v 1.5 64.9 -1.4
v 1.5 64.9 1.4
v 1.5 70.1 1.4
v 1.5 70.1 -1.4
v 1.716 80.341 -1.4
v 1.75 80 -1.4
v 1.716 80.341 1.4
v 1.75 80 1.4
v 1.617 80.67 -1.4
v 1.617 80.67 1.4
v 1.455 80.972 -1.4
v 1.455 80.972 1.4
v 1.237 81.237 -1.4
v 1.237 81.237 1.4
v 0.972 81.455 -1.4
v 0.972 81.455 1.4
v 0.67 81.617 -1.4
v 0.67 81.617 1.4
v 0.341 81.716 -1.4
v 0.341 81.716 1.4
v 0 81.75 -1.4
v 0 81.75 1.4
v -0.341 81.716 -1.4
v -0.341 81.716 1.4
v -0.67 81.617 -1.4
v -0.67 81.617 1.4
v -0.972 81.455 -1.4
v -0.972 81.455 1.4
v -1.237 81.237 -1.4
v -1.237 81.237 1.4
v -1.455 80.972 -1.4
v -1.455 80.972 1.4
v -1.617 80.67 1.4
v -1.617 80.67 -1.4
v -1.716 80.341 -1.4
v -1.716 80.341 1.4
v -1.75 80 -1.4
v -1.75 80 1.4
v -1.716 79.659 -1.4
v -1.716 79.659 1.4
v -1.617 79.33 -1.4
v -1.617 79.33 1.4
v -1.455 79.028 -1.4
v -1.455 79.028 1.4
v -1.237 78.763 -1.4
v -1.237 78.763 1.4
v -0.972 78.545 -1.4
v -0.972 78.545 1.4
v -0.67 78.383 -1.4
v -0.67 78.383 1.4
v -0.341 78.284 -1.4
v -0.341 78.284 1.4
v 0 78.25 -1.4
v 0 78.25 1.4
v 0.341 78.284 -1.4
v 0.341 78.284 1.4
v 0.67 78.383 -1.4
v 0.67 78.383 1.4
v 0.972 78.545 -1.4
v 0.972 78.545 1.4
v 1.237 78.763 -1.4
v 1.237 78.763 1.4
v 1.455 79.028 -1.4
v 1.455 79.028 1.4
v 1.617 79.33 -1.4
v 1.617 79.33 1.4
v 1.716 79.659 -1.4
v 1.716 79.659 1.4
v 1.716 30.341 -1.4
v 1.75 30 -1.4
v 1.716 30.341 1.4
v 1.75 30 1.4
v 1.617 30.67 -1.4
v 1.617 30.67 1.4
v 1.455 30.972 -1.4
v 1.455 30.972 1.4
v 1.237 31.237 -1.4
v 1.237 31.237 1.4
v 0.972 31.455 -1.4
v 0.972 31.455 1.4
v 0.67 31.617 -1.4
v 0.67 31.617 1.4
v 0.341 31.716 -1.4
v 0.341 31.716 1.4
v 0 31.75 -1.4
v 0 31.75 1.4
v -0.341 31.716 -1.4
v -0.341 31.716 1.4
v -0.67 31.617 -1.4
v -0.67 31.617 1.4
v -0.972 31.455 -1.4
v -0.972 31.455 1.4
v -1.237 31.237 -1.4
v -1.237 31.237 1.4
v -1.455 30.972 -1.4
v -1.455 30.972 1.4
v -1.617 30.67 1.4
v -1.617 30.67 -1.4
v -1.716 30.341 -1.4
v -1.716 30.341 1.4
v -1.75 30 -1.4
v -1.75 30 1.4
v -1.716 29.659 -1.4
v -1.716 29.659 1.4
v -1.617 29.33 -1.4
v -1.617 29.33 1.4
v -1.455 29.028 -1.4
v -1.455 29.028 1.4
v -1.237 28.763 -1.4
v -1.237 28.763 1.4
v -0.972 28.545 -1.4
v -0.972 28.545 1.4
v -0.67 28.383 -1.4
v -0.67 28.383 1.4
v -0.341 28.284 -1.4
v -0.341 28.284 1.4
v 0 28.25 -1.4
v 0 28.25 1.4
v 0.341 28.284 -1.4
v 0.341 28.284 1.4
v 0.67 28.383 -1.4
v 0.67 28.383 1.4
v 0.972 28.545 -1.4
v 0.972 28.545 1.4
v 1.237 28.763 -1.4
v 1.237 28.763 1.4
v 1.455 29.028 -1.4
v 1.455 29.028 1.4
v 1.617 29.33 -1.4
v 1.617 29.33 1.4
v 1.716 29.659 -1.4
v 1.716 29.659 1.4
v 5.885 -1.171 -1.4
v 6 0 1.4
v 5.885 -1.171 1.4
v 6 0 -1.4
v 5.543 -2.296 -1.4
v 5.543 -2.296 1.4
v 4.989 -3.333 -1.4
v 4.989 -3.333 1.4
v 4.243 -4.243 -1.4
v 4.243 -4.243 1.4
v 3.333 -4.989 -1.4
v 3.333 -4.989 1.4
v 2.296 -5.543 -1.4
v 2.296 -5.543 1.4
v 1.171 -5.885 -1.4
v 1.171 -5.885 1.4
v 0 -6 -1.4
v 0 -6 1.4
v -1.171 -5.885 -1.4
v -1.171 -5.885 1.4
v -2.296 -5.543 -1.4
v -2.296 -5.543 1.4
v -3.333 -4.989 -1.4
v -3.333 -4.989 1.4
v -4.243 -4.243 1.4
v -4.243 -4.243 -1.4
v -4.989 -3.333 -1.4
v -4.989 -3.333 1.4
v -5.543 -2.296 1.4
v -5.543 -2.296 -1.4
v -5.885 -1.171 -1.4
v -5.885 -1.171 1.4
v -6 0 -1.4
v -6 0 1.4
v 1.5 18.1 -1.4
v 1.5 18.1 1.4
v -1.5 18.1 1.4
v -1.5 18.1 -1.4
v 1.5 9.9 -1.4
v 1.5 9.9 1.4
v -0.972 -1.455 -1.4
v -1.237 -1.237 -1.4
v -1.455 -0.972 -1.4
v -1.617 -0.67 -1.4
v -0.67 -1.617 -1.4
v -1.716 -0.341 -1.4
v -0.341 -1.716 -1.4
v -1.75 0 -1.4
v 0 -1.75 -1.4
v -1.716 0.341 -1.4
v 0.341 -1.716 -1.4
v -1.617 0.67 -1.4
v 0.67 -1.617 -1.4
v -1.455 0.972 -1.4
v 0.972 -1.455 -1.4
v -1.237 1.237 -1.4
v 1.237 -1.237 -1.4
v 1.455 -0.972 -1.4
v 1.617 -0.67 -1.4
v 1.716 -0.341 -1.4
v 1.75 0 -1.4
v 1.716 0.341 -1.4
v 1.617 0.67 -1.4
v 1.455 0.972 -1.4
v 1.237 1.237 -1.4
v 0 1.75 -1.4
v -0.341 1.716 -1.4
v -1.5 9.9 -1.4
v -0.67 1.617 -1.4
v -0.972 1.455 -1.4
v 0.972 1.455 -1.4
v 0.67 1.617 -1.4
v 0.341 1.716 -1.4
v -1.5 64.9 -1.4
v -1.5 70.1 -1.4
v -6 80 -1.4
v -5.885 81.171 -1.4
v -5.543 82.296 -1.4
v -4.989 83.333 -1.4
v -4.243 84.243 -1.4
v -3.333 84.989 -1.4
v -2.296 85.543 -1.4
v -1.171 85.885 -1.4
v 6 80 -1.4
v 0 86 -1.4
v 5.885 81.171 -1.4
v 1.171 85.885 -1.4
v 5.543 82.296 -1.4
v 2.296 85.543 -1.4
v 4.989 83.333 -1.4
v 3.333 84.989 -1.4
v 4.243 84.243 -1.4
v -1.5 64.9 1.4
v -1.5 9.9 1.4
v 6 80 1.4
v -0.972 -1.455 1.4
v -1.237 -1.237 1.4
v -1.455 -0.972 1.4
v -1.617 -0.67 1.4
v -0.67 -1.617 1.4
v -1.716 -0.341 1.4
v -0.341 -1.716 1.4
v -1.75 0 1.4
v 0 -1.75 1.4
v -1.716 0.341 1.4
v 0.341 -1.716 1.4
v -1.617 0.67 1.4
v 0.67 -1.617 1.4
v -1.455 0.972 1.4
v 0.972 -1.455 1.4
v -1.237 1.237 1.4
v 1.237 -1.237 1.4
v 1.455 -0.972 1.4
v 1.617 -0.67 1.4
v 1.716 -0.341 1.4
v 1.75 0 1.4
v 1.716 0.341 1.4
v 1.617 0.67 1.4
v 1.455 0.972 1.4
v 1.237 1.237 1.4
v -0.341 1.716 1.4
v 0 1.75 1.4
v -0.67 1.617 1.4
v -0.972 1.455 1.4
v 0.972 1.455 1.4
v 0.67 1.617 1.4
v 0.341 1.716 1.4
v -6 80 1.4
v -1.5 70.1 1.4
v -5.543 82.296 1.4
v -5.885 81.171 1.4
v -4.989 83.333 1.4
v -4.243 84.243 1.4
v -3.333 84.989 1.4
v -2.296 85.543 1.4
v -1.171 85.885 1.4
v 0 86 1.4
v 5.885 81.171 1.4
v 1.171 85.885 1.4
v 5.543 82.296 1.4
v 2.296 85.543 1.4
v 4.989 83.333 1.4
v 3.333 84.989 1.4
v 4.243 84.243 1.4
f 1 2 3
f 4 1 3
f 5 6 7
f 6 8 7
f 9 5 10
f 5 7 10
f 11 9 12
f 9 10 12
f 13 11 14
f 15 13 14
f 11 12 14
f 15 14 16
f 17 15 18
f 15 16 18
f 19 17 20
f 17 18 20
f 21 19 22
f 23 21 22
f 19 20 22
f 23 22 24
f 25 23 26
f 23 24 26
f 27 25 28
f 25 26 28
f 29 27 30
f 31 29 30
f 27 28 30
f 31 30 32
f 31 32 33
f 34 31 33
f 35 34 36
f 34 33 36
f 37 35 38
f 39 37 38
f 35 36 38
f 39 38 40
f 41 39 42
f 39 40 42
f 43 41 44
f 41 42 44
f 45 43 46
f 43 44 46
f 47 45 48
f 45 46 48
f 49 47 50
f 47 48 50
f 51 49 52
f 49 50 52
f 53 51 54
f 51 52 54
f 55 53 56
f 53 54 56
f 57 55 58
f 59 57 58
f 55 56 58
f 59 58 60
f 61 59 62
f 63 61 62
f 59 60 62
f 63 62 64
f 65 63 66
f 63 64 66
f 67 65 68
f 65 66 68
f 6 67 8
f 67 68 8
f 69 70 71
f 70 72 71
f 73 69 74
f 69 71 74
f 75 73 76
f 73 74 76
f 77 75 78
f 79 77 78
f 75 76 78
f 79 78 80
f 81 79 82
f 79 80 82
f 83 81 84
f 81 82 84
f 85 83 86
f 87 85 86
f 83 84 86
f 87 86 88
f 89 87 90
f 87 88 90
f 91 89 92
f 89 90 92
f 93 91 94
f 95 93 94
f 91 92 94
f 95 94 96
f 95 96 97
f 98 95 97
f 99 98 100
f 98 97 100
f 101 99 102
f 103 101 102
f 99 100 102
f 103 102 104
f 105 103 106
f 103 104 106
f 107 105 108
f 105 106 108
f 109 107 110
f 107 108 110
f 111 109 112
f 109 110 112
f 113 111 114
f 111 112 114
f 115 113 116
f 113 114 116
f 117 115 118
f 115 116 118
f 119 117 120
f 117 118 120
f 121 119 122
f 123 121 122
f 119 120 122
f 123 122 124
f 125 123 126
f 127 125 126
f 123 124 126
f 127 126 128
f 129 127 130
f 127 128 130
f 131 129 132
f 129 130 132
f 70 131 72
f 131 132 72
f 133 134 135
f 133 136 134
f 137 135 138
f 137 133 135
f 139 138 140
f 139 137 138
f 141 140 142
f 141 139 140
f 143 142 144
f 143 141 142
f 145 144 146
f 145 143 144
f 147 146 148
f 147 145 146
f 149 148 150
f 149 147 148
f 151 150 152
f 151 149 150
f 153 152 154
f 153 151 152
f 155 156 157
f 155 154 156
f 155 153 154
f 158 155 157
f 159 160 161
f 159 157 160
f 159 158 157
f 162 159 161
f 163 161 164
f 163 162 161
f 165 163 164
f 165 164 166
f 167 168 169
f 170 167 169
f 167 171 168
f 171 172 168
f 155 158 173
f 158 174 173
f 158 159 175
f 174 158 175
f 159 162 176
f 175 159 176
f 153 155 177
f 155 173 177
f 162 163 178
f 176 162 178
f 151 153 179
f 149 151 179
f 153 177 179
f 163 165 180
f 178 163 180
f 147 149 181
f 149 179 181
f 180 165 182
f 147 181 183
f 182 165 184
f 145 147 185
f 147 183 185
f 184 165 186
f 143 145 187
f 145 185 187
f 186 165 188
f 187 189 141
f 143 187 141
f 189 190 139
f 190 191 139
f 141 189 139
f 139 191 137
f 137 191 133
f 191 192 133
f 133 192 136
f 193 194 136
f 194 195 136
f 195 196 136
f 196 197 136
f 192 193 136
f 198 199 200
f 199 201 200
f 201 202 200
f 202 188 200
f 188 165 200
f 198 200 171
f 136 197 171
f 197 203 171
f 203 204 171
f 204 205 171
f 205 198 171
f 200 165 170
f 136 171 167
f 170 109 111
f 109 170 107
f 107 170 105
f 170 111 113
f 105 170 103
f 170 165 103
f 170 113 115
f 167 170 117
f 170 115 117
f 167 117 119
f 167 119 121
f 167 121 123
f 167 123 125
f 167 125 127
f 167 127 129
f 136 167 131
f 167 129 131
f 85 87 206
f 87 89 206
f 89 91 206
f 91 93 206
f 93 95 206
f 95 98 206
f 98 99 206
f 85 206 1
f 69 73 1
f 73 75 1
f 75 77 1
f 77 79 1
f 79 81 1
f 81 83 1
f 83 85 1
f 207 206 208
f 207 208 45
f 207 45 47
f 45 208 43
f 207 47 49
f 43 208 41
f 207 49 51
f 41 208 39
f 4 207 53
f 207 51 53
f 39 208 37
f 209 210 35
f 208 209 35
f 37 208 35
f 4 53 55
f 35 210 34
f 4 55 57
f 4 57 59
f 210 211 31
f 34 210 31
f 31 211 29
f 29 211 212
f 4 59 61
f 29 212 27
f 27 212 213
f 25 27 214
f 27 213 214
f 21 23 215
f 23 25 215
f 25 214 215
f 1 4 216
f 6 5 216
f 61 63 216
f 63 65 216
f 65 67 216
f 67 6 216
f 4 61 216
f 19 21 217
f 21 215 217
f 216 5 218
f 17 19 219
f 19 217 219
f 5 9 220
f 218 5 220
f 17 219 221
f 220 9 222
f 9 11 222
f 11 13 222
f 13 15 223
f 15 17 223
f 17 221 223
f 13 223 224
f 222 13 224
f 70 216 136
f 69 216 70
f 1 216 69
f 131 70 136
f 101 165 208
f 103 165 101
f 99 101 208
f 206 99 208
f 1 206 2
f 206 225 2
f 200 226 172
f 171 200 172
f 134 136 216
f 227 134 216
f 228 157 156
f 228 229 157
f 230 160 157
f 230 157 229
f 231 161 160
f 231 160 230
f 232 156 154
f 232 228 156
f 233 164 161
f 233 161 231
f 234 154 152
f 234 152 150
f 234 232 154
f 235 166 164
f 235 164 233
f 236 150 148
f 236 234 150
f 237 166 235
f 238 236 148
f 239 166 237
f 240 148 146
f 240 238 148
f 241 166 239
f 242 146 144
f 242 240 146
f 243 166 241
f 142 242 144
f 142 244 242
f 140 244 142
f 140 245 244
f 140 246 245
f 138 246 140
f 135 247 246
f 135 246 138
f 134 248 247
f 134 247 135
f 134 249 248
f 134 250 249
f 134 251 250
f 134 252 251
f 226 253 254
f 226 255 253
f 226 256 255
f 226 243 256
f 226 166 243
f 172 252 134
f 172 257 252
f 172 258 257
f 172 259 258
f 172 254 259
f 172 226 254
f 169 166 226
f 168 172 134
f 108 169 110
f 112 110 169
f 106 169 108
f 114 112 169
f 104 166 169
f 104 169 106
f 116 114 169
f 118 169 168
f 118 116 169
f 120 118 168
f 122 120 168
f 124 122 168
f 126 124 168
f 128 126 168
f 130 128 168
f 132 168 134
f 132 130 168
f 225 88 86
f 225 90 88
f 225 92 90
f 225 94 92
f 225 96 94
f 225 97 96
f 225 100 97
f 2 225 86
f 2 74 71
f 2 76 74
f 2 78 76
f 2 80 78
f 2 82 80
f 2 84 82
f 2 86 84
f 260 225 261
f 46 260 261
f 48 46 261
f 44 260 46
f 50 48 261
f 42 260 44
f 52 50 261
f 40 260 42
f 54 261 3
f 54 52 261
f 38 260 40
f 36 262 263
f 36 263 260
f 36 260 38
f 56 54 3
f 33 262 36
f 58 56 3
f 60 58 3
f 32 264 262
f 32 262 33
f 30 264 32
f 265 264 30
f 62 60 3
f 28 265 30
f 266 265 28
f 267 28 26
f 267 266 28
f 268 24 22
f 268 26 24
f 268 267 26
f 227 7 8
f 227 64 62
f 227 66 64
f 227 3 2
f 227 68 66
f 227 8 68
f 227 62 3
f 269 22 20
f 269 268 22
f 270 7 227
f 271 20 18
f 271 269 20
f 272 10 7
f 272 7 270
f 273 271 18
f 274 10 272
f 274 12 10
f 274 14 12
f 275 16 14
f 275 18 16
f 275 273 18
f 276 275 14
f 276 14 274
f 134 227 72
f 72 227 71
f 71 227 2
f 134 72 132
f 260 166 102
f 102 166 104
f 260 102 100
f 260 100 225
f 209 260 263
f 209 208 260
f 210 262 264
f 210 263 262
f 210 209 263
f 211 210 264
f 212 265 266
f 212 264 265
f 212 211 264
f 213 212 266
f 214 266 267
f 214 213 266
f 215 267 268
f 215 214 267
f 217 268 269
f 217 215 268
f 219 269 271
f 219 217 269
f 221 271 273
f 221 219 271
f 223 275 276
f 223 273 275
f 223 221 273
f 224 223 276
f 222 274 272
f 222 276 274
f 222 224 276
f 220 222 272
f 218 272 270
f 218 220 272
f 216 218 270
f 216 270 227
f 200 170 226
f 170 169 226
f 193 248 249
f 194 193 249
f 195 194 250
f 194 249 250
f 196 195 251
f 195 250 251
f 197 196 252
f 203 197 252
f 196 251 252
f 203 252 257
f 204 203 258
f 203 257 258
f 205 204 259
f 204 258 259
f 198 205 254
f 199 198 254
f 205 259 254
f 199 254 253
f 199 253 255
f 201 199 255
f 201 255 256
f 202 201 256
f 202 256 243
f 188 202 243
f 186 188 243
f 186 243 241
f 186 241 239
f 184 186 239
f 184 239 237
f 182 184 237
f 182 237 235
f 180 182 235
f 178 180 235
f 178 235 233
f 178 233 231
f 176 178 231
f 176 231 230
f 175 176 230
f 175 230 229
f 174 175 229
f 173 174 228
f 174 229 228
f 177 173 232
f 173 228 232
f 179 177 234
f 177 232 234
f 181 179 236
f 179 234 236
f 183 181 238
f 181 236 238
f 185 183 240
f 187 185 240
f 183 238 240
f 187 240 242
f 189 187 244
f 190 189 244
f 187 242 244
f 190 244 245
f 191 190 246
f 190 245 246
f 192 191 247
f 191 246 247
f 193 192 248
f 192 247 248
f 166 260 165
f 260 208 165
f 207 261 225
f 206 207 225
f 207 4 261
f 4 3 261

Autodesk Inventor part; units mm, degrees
ref_plane "YZ Plane" through (0, 0, 0) normal (1, 0, 0) x (0, 1, 0)
ref_plane "XZ Plane" through (0, 0, 0) normal (0, 1, 0) x (-1, 0, 0)
ref_plane "XY Plane" through (0, 0, 0) normal (0, 0, 1) x (1, 0, 0)
sketch "Sketch1" plane through (0, 0, 0) normal (0, 0, 1) x (1, 0, 0)
  circle A0 centre (0, 0) radius 6
  line L0 (0, 0) -> (0, 80) construction
  line L1 (6, 0) -> (6, 80)
  line L2 (-6, 80) -> (-6, 0)
  arc A1 (-6, 0) -> (6, 0) centre (0, 0) ccw
  arc A2 (6, 80) -> (-6, 80) centre (0, 80) ccw
  point P0 (0, 40)
  dimension "d0" = 12
  dimension "d1" = 12
  dimension "d2" = 80
extrude "Extrusion1" add sketch "Sketch1" along normal mid plane 2.8
sketch "Sketch2" plane through (0, 0, 1.4) normal (0, 0, 1) x (1, 0, 0)
  arc A0 (6, 80) -> (-6, 80) centre (0, 80) ccw construction
  arc A1 (-6, 0) -> (6, 0) centre (0, 0) ccw construction
  circle A2 centre (0, 0) radius 1.75
  circle A3 centre (0, 80) radius 1.75
  line L0 (-1.5, 64.9) -> (1.5, 64.9)
  line L1 (1.5, 64.9) -> (1.5, 70.1)
  line L2 (1.5, 70.1) -> (-1.5, 70.1)
  line L3 (-1.5, 70.1) -> (-1.5, 64.9)
  circle A4 centre (0, 30) radius 1.75
  line L4 (-1.5, 9.9) -> (1.5, 9.9)
  line L5 (1.5, 9.9) -> (1.5, 18.1)
  line L6 (1.5, 18.1) -> (-1.5, 18.1)
  line L7 (-1.5, 18.1) -> (-1.5, 9.9)
  point P0 (0, 9.9)
  point P1 (0, 64.9)
  point P2 (1.5, 14)
  point P3 (1.5, 67.5)
  dimension "d8" = 3.5
  dimension "d9" = 3.5
  dimension "d12" = 3
  dimension "d13" = 8.2
  dimension "d16" = 5.2
  dimension "d18" = 14
  dimension "d19" = 30
  dimension "d20" = 12.5
extrude "Extrusion2" cut sketch "Sketch2" against normal through all
